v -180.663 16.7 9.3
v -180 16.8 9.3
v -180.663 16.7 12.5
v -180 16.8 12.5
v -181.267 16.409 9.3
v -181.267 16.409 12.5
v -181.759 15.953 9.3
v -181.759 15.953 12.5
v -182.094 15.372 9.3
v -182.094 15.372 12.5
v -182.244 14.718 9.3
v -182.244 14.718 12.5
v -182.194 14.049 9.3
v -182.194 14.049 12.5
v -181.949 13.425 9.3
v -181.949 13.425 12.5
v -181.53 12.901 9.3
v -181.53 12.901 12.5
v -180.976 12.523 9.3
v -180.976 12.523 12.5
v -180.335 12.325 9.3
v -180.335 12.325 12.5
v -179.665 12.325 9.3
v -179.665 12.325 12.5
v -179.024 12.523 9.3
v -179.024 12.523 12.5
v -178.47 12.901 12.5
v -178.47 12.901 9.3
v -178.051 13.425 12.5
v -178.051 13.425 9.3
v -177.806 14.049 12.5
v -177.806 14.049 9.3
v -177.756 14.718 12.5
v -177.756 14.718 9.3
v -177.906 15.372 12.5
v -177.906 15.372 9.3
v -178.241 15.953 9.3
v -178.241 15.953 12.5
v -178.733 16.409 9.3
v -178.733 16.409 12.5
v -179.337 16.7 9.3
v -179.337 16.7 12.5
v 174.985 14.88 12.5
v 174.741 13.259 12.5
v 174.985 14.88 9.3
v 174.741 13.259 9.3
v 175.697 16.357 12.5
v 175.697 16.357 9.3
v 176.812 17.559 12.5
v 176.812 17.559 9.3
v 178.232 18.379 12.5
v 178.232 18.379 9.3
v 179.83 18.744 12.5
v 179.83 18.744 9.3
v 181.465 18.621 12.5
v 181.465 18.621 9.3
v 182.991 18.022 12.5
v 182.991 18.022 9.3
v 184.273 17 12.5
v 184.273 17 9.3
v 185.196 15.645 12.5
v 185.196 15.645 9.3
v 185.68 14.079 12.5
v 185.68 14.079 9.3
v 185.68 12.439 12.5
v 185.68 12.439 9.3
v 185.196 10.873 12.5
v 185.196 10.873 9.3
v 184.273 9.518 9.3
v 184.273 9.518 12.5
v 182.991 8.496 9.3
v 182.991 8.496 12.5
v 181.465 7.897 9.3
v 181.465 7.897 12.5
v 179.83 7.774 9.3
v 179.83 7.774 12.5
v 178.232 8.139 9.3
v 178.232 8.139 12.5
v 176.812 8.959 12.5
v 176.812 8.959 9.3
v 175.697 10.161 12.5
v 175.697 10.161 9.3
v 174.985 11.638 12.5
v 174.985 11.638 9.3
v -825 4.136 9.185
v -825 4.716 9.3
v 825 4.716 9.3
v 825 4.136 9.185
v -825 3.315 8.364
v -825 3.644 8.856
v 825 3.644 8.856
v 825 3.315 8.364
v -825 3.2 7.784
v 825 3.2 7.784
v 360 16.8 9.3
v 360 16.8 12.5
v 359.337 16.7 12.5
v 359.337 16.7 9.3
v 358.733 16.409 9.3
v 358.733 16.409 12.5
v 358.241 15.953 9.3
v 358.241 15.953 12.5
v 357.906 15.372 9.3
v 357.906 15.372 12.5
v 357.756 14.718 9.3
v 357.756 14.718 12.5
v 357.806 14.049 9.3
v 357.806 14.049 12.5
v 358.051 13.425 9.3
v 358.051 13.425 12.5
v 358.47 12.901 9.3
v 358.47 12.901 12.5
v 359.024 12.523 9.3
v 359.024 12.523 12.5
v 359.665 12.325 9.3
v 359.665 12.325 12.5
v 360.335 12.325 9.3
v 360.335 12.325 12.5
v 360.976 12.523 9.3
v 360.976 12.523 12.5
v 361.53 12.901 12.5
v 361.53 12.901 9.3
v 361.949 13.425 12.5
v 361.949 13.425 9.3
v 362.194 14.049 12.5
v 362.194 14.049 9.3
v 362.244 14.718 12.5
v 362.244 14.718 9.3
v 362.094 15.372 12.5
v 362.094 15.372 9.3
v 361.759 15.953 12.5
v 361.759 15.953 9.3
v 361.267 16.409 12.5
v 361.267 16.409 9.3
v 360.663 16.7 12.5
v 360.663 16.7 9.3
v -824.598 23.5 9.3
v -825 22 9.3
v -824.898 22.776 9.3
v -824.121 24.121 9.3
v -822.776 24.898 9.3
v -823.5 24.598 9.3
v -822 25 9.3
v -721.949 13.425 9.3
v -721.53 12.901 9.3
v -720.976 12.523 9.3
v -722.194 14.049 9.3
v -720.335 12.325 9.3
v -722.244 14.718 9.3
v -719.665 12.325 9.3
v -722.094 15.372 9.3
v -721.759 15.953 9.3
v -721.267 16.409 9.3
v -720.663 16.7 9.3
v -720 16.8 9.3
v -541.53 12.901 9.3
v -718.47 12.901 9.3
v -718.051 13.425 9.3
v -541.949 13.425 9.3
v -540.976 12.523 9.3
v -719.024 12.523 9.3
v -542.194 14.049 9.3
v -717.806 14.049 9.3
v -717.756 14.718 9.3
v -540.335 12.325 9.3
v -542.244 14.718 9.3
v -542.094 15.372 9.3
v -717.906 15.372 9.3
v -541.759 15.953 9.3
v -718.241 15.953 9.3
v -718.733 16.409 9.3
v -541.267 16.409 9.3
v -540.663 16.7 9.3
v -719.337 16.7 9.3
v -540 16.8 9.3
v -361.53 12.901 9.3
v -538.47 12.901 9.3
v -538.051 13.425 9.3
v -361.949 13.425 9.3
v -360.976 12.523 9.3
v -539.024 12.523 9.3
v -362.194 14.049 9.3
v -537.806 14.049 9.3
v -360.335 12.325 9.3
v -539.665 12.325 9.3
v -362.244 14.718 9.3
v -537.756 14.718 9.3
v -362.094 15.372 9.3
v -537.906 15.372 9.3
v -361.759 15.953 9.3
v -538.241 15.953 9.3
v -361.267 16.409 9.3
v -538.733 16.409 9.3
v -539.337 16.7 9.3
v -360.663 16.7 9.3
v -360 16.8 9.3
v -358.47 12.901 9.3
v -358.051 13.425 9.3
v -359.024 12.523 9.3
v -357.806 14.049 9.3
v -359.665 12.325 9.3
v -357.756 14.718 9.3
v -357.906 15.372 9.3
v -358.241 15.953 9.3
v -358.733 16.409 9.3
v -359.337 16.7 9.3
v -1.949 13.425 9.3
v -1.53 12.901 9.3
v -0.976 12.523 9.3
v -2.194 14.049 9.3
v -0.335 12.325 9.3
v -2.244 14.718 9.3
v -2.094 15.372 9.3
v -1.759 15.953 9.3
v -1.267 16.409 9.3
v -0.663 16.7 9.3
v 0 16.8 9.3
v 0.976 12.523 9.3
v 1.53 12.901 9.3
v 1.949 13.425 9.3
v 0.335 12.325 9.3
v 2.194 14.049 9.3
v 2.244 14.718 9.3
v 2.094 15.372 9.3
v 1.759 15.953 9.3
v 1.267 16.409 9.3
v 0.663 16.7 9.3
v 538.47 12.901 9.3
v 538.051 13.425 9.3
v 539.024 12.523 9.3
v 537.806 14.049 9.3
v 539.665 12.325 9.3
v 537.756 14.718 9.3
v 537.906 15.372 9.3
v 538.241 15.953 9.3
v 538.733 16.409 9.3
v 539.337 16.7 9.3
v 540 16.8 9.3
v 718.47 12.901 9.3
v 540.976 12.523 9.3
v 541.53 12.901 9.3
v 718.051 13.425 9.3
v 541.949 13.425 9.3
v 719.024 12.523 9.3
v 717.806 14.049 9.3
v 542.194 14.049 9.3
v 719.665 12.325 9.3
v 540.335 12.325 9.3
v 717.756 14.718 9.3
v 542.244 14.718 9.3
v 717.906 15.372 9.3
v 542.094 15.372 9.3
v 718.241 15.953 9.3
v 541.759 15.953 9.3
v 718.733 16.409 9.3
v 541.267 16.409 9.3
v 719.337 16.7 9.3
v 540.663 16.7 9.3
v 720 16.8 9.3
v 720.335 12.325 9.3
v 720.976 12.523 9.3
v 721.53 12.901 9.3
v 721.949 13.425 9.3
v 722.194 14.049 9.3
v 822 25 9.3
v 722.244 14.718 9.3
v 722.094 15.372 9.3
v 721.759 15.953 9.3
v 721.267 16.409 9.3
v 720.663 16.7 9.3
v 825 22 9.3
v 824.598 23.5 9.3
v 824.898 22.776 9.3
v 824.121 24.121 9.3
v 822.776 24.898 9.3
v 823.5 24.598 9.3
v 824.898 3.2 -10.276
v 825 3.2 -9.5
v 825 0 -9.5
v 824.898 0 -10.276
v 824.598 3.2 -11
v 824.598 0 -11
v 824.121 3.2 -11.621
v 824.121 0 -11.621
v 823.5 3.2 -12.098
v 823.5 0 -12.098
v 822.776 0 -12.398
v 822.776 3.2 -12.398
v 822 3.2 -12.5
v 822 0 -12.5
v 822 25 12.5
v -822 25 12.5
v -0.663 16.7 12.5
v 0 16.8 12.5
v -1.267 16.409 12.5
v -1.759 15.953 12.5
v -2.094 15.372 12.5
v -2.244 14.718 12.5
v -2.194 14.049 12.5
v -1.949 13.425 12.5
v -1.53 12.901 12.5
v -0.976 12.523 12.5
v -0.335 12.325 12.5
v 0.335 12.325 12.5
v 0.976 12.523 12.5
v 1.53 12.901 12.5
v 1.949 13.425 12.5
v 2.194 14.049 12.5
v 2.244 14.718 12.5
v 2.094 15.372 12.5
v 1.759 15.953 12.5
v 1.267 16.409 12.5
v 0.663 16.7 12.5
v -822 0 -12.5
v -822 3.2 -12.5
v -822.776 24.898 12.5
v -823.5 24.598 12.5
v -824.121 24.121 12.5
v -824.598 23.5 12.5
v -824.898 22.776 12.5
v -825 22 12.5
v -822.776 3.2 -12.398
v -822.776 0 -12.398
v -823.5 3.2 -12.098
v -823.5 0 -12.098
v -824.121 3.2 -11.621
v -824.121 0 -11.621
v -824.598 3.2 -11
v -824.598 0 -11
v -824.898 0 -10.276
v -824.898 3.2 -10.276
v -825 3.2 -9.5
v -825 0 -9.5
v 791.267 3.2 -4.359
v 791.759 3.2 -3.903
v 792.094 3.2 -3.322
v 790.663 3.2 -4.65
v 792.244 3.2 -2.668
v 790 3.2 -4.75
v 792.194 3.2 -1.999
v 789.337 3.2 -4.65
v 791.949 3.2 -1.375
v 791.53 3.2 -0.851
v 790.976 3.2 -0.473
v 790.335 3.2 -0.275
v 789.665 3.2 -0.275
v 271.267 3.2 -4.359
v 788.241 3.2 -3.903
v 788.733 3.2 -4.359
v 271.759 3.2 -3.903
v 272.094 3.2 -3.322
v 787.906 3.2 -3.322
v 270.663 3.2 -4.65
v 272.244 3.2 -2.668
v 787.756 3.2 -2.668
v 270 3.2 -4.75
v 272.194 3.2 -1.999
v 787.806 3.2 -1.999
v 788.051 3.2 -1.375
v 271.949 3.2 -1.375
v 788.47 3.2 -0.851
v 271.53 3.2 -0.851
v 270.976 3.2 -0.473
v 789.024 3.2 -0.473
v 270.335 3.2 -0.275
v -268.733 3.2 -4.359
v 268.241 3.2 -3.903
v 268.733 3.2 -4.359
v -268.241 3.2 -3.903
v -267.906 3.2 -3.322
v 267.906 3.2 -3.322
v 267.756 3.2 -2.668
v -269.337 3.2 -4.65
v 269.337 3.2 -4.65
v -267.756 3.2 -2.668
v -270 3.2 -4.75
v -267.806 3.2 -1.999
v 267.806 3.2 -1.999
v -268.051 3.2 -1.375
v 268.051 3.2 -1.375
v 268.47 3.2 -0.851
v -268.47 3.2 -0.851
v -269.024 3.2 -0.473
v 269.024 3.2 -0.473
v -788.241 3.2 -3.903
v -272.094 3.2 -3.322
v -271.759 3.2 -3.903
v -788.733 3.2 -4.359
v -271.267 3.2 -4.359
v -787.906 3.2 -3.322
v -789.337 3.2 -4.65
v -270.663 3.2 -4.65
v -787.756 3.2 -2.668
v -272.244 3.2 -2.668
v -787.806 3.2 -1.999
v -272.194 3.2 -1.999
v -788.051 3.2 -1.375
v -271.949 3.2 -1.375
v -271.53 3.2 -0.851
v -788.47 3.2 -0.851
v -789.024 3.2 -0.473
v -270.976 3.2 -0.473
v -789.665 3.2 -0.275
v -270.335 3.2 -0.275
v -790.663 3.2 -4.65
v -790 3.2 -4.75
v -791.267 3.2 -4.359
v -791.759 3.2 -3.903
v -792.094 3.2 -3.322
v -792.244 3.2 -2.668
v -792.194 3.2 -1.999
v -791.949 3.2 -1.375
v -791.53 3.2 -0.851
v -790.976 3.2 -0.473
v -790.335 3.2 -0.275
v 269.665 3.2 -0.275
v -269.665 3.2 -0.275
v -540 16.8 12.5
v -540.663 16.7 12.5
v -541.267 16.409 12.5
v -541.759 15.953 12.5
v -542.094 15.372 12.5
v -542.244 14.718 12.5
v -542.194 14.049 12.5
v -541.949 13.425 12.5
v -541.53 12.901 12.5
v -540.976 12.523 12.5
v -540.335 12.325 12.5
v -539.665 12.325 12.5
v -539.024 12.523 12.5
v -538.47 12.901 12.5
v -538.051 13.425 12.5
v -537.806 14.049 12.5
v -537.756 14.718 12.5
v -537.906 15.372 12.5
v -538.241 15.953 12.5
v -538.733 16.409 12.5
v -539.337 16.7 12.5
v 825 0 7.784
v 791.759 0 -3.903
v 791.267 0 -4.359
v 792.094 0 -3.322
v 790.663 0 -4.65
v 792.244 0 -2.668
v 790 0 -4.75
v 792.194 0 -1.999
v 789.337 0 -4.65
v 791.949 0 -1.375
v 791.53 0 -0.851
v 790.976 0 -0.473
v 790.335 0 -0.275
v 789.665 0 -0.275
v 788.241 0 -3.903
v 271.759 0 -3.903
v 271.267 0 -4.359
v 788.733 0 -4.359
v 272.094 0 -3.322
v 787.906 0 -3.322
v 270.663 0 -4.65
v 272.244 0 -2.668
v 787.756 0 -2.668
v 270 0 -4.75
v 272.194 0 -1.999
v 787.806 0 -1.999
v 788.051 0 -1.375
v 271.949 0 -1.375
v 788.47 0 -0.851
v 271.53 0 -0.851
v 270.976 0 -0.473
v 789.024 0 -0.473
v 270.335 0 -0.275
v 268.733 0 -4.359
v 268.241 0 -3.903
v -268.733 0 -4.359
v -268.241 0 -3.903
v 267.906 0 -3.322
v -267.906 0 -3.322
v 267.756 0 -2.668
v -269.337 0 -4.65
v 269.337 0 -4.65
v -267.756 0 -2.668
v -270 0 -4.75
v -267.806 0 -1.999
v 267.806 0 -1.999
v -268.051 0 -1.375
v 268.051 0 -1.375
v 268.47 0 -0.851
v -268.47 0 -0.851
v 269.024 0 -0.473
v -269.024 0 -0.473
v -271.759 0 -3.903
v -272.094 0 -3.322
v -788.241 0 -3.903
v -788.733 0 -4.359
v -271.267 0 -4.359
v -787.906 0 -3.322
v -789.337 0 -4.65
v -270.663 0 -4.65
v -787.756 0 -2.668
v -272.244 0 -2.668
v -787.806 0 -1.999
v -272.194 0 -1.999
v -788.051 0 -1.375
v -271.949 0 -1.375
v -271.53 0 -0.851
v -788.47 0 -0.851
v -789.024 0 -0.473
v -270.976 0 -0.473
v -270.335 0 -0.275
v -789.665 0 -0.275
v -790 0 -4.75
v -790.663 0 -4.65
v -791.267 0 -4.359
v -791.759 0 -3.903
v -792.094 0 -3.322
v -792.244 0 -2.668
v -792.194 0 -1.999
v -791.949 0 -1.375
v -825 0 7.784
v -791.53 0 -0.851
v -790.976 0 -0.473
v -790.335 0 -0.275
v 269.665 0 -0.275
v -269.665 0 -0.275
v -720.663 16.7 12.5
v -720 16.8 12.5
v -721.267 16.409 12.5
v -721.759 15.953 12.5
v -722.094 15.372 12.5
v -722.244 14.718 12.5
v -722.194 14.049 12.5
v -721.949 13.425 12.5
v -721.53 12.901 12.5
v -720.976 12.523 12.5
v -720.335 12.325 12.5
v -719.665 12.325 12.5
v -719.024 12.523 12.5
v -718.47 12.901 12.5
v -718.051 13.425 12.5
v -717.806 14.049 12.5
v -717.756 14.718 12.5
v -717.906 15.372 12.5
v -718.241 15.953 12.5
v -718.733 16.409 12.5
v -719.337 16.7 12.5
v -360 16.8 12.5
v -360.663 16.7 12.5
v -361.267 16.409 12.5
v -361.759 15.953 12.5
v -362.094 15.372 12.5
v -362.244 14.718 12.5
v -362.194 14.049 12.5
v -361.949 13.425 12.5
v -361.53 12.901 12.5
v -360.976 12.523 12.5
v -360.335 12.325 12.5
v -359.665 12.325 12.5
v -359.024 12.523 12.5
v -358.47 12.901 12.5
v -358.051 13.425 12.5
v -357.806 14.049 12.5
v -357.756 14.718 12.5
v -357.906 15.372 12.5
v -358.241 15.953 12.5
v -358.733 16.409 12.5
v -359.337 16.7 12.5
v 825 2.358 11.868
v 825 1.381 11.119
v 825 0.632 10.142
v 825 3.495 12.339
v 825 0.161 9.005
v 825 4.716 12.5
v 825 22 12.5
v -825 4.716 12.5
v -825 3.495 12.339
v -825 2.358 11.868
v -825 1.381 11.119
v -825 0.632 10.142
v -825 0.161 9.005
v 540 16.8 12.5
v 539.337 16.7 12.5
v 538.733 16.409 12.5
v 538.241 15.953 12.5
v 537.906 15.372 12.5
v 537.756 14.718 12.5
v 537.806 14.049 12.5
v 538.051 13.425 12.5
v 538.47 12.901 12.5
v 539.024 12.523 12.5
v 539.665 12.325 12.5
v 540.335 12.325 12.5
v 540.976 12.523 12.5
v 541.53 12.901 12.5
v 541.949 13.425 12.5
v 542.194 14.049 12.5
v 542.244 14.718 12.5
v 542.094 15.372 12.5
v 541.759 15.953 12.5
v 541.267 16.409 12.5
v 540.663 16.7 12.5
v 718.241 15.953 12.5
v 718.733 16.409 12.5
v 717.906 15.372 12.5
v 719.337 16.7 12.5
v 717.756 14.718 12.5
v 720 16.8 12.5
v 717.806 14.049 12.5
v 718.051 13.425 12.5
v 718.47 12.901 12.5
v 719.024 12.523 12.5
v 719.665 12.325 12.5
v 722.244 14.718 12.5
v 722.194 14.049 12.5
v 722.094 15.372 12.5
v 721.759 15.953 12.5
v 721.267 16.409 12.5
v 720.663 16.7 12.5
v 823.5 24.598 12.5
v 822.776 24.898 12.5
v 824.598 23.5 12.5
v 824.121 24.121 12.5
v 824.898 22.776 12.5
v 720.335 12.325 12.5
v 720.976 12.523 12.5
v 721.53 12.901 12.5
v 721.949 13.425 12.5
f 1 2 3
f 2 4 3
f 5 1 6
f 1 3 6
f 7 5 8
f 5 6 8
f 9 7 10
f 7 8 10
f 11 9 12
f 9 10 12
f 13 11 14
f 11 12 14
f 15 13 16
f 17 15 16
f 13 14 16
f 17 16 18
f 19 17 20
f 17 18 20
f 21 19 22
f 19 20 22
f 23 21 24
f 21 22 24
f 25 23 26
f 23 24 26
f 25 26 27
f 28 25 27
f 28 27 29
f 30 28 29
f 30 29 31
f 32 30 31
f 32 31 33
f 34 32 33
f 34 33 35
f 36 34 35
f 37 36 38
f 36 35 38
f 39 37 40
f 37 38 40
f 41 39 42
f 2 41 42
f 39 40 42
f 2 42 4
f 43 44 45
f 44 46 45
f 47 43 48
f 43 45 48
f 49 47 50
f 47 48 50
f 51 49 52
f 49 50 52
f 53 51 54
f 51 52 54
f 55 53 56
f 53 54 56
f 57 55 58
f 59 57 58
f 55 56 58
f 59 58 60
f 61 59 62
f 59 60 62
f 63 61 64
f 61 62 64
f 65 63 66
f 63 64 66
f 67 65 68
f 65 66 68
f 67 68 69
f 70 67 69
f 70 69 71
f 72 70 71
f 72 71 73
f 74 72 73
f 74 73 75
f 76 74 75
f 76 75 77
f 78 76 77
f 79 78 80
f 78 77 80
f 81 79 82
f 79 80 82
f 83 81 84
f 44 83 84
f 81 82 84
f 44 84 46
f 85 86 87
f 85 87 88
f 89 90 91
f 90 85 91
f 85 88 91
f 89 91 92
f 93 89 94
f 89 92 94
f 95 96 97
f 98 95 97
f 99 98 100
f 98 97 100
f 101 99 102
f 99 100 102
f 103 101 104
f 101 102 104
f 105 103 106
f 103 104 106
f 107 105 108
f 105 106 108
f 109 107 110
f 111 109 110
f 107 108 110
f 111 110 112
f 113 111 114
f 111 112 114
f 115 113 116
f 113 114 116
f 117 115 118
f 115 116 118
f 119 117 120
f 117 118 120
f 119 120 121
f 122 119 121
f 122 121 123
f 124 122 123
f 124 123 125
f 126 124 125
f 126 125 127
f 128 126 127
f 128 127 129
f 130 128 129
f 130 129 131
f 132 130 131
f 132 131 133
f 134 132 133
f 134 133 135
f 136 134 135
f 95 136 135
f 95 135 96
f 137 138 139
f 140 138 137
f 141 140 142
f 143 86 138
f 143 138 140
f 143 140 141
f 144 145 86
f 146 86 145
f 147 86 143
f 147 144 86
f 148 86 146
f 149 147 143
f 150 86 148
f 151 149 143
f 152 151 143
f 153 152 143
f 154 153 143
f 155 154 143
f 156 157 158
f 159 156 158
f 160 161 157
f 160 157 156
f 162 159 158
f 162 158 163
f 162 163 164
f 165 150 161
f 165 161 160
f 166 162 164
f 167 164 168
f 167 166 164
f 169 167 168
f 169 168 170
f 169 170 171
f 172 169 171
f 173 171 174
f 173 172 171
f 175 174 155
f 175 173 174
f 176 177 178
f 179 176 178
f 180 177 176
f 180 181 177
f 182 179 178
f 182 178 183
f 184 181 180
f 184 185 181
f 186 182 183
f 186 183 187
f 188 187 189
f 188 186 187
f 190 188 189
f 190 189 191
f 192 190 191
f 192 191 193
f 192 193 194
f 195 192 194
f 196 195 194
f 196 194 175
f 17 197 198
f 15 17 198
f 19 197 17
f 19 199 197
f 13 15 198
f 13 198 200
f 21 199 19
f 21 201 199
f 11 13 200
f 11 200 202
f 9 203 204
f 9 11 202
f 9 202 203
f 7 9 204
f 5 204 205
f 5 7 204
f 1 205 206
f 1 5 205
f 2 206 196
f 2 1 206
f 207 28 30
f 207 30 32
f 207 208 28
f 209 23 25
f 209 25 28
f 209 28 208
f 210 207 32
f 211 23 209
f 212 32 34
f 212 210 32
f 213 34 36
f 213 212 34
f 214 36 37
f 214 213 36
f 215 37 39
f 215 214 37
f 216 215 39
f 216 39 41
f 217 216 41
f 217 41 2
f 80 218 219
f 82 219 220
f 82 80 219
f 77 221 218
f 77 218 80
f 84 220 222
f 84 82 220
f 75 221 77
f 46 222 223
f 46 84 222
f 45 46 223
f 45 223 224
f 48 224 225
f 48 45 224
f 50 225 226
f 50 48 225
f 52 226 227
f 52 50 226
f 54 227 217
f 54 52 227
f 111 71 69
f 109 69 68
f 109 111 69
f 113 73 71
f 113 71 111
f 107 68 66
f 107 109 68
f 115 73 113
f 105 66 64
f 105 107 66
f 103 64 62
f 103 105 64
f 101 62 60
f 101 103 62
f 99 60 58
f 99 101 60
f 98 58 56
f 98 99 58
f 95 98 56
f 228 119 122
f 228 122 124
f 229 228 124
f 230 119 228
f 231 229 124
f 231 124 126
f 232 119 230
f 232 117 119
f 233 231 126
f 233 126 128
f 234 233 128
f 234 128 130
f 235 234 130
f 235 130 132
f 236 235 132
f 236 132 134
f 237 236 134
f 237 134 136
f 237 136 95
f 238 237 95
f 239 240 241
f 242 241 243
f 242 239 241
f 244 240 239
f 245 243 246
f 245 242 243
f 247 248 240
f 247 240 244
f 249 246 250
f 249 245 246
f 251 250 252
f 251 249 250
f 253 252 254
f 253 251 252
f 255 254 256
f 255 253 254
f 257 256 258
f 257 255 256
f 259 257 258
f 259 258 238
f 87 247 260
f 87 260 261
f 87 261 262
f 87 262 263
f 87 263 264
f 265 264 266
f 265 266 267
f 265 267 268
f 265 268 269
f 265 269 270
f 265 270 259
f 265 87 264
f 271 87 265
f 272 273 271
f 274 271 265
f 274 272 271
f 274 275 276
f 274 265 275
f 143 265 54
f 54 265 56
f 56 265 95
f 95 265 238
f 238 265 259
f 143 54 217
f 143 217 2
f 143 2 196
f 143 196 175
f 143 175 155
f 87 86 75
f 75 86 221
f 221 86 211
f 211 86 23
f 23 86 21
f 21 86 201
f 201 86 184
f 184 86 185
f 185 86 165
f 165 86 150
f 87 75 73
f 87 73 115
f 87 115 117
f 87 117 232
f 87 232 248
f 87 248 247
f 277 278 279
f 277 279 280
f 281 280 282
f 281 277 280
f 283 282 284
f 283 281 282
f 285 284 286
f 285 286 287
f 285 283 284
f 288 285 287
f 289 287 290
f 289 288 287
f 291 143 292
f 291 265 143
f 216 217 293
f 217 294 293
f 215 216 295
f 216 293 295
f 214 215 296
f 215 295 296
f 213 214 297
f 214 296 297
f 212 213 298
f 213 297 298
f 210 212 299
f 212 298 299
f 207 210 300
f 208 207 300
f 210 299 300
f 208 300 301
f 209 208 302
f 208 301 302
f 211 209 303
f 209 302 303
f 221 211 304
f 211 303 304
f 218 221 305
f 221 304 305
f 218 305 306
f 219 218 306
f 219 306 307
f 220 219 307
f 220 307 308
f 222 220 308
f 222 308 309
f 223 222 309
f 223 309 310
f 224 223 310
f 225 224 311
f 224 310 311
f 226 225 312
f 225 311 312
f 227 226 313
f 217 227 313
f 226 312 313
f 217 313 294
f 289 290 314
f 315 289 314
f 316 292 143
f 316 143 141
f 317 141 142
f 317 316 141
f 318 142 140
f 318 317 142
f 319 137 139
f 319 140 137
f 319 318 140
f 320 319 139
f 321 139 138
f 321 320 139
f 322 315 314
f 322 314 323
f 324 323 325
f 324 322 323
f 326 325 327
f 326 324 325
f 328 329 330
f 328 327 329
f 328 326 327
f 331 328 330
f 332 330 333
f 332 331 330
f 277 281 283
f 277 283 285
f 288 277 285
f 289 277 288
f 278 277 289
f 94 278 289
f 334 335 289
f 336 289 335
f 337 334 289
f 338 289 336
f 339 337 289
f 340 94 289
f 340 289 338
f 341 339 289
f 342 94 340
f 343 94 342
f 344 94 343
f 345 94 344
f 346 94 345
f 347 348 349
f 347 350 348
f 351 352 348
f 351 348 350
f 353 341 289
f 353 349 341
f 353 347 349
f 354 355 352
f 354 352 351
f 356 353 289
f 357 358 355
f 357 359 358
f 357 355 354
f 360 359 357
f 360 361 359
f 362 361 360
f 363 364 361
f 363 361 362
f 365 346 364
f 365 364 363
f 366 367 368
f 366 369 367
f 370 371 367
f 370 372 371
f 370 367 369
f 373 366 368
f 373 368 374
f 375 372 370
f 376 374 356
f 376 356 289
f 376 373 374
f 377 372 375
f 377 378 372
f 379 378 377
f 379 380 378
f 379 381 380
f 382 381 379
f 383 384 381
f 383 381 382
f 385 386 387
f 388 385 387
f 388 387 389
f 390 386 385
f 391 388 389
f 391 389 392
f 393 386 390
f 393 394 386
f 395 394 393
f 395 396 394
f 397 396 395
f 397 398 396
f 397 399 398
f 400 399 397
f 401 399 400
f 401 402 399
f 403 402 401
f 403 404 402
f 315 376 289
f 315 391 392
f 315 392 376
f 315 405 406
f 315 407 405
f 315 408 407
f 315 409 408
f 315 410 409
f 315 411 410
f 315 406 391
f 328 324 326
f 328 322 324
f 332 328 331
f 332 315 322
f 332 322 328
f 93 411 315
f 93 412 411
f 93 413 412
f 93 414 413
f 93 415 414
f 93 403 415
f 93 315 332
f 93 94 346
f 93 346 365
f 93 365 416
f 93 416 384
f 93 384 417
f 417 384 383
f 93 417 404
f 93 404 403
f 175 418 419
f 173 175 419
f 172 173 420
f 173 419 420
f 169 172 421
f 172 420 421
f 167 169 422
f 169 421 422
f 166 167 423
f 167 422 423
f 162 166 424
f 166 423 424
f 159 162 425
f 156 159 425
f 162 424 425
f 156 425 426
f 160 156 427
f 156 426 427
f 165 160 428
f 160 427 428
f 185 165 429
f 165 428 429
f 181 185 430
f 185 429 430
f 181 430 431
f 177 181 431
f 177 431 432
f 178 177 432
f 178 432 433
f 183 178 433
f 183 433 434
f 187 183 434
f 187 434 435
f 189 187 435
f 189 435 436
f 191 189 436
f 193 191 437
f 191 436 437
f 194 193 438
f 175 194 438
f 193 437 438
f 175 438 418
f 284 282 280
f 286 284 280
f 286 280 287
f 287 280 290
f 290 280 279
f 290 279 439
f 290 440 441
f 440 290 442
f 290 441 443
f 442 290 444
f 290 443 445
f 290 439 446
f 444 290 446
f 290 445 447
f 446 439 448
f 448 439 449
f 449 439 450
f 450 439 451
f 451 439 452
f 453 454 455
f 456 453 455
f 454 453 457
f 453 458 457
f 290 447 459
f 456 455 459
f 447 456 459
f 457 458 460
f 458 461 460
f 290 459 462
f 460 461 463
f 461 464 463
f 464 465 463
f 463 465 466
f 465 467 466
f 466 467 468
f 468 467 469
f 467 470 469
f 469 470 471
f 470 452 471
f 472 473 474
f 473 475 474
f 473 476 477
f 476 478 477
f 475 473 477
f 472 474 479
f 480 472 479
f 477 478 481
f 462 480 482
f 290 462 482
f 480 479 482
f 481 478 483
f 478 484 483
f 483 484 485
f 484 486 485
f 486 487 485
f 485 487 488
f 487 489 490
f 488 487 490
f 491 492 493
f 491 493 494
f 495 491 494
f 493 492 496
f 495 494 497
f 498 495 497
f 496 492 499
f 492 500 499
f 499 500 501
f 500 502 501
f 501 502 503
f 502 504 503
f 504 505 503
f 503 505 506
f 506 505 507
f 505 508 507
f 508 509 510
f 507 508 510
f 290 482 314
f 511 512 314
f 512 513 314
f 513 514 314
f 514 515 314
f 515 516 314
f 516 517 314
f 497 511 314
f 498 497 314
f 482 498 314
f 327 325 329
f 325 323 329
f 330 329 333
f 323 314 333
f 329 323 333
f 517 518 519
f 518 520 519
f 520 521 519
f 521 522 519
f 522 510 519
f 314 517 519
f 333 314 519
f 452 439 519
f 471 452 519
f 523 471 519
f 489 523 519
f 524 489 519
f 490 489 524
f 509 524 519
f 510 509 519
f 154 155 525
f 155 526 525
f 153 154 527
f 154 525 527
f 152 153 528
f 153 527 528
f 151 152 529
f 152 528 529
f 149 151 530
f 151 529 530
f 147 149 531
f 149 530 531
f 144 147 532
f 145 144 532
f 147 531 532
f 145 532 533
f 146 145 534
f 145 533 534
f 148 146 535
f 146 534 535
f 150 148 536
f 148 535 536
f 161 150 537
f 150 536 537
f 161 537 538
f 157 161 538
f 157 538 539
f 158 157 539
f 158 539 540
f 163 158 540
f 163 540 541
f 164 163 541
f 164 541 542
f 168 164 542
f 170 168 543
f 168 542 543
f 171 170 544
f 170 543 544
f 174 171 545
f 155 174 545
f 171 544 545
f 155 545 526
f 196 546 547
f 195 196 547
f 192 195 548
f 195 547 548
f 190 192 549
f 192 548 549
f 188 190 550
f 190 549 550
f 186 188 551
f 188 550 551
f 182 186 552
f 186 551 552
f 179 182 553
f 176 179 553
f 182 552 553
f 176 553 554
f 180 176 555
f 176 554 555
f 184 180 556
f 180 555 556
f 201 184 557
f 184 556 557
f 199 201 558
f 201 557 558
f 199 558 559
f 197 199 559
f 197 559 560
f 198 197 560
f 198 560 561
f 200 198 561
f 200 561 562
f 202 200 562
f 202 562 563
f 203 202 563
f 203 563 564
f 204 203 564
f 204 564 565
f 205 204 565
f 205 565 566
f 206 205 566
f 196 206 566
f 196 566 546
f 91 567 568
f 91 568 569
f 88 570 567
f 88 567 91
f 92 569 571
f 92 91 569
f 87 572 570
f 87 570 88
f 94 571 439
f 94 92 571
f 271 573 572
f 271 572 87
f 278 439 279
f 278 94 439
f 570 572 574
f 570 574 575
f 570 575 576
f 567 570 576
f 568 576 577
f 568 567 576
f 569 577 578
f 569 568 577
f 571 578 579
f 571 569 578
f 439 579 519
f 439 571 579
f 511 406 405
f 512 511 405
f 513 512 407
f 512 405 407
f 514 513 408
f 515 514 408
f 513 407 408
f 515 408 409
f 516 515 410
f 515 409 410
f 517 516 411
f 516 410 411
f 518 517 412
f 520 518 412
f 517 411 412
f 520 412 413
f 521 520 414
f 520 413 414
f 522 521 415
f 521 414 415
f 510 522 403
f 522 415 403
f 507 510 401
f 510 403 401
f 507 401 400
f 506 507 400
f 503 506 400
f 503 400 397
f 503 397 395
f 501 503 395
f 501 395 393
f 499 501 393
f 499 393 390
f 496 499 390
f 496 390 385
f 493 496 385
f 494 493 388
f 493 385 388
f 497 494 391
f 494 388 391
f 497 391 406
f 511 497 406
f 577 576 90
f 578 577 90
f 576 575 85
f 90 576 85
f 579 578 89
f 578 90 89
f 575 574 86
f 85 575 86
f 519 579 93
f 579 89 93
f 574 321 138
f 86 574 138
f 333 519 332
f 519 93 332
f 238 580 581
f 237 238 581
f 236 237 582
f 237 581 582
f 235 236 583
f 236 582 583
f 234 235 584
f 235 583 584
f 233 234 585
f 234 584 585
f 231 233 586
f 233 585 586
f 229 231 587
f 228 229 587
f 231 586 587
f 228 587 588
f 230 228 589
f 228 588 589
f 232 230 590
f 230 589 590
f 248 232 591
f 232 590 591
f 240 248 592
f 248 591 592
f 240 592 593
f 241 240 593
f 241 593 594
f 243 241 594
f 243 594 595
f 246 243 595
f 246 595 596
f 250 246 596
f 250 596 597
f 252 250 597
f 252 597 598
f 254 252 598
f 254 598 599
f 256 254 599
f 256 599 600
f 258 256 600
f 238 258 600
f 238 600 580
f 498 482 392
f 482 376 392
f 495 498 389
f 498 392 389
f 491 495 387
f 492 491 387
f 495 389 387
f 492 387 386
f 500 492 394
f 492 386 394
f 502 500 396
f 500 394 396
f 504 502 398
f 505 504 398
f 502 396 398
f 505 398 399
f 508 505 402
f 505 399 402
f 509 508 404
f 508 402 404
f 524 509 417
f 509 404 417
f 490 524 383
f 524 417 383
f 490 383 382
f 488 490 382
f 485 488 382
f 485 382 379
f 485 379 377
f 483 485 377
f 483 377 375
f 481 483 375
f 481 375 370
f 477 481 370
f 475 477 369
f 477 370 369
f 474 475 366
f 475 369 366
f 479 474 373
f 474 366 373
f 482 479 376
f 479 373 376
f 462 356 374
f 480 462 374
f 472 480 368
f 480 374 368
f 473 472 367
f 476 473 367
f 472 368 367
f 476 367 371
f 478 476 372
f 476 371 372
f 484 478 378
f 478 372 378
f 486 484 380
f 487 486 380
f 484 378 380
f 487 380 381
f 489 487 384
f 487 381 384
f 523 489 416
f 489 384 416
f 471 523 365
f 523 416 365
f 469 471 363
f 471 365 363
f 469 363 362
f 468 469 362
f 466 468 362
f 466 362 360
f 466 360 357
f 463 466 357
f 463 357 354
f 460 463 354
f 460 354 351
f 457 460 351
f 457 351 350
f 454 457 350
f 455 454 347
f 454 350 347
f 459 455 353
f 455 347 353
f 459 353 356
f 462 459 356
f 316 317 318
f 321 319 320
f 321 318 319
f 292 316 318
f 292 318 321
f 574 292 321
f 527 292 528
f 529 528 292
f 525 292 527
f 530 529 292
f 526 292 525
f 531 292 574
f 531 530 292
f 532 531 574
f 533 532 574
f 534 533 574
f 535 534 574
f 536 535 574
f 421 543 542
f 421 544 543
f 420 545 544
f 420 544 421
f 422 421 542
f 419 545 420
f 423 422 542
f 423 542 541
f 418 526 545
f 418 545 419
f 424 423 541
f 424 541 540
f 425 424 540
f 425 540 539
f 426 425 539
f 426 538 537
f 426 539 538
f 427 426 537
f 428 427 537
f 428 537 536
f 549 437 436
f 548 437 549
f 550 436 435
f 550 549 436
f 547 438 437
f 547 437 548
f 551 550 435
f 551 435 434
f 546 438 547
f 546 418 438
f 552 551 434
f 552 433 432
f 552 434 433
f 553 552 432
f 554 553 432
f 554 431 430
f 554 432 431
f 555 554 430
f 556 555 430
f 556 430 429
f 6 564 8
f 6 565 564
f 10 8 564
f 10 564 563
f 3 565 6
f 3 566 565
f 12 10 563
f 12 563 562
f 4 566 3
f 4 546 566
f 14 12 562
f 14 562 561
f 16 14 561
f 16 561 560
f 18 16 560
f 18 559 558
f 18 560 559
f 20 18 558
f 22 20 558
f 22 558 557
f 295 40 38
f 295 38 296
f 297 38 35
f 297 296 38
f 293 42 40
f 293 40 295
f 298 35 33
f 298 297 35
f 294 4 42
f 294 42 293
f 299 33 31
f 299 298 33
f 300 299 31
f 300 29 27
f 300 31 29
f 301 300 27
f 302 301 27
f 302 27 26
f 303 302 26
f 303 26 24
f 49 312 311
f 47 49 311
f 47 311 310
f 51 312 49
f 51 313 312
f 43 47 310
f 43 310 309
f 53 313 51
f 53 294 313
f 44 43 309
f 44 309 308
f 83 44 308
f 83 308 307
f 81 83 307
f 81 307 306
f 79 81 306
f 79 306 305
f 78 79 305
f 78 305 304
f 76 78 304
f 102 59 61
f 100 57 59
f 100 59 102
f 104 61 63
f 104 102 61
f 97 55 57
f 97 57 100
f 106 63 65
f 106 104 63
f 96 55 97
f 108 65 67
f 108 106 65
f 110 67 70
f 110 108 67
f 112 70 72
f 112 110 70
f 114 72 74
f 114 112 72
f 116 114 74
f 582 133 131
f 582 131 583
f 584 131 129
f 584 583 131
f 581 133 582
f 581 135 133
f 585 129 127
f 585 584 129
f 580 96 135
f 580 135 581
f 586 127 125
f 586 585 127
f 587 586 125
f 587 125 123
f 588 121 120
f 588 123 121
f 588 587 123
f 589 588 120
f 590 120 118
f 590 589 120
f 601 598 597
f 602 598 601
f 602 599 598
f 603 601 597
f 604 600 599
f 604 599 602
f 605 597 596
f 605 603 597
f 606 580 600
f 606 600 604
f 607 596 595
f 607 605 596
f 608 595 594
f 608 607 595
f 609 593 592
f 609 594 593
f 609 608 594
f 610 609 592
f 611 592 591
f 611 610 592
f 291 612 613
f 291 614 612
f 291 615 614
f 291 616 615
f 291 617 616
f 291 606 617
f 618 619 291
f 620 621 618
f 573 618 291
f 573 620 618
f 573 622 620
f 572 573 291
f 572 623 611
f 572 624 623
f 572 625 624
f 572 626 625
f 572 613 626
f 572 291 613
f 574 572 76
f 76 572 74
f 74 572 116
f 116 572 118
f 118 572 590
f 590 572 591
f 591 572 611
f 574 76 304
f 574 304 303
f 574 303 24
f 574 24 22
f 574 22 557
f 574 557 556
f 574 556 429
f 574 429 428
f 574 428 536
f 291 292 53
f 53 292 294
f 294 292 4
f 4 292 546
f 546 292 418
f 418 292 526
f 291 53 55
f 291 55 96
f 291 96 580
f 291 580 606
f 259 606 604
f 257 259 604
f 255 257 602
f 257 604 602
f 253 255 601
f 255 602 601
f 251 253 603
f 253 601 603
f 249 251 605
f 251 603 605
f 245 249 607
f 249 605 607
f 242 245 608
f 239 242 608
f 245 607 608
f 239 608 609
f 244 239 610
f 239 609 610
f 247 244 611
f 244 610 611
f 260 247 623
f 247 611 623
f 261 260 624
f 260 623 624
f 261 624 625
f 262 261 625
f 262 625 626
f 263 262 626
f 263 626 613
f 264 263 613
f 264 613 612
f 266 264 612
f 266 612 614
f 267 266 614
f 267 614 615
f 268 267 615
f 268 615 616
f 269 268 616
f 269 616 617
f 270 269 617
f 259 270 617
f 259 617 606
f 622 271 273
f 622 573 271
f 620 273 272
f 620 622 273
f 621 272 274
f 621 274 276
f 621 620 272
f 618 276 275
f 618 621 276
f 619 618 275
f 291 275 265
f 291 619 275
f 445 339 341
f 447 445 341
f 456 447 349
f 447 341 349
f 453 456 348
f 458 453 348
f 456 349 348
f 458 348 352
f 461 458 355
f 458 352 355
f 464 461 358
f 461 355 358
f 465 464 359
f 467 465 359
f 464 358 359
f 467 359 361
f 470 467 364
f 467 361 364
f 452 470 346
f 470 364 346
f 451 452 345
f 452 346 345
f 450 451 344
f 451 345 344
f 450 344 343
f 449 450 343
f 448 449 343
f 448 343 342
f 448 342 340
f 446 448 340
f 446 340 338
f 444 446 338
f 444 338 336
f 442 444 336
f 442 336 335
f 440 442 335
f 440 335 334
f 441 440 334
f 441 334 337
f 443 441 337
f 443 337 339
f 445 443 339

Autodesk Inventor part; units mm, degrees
ref_plane "YZ Plane" through (0, 0, 0) normal (1, 0, 0) x (0, 1, 0)
ref_plane "XZ Plane" through (0, 0, 0) normal (0, 1, 0) x (-1, 0, 0)
ref_plane "XY Plane" through (0, 0, 0) normal (0, 0, 1) x (1, 0, 0)
sketch "Sketch1" plane through (0, 0, 0) normal (0, 1, 0) x (-1, 0, 0)
  line L0 (825, 12.5) -> (-825, 12.5)
  line L1 (-825, 12.5) -> (-825, -12.5)
  line L2 (-825, -12.5) -> (825, -12.5)
  line L3 (825, -12.5) -> (825, 12.5)
  line L4 (825, 12.5) -> (-825, -12.5) construction
  line L5 (-825, 12.5) -> (825, -12.5) construction
  point P0 (0, 0)
  dimension "d0" = 1650
  dimension "d1" = 25
extrude "Plate1" add sketch "Sketch1" along normal blind 3.2
sketch "Sketch2" plane through (825, 0, 9.3) normal (0, 0, 1) x (1, 0, 0)
  line L0 (-1650, 0) -> (0, 0)
  line L1 (0, 0) -> (0, 25)
  line L2 (0, 25) -> (-1650, 25)
  line L3 (-1650, 25) -> (-1650, 0)
edge flange "Flange1" height 25 angle 90 thickness 3.2 bend radius 1.516 thickness toward (0, 0, 1) relief tear relief width 3.2 relief depth 1.6 edges at (0, 3.2, 12.5) wall of the first edge with corners at (-825, 0, 9.3) (825, 0, 9.3) (825, 25, 9.3) (-825, 25, 9.3)
bend "Bend1"
corner "Corner1"
sketch "Sketch3" plane through (825, 25, 9.3) normal (0, 0, -1) x (-1, 0, 0)
  circle A0 centre (105, -10.45) radius 1.5706 projected
  circle A1 centre (285, -10.45) radius 1.5706 projected
  circle A2 centre (465, -10.45) radius 1.5706 projected
  circle A3 centre (825, -10.45) radius 1.5706 projected
  circle A4 centre (1005, -10.45) radius 1.5706 projected
  circle A5 centre (1185, -10.45) radius 1.5706 projected
  circle A6 centre (1365, -10.45) radius 1.5706 projected
  circle A7 centre (1545, -10.45) radius 1.5706 projected
  point P0 (825, -25)
hole "Hole1" at (540, 14.55, 9.3) at (720, 14.55, 9.3) at (360, 14.55, 9.3) at (0, 14.55, 9.3) at (-180, 14.55, 9.3) at (-360, 14.55, 9.3) at (-540, 14.55, 9.3) at (-720, 14.55, 9.3) direction (0, 0, 1) diameter 4.5 depth 3.2 tip angle 118 clearance for "Countersunk Flat Head Screw ISO 2009/7046" size "M4" standard "ISO"
sketch "Sketch8" plane through (0, 0, 0) normal (0, -1, 0) x (1, 0, 0)
  line L0 (-825, -12.5) -> (825, -12.5) projected
  line L1 (0, -12.5) -> (0, -2.5)
  line L2 (0, -2.5) -> (-270, -2.5)
  line L3 (-270, -2.5) -> (-790, -2.5)
  line L4 (0, -2.5) -> (270, -2.5)
  line L5 (270, -2.5) -> (790, -2.5)
  point P0 (0, 0)
  dimension "d40" = 10
  dimension "d41" = 270
  dimension "d42" = 520
  dimension "d43" = 180
hole "Hole2" at (-790, 0, -2.5) at (-270, 0, -2.5) at (270, 0, -2.5) at (790, 0, -2.5) direction (0, 1, 0) diameter 4.5 depth 3.2 tip angle 118 clearance for "Countersunk Flat Head Screw ISO 2009/7046" size "M4" standard "ISO"
fillet "Corner Round1" radius 3 4 edges at (825, 1.6, -12.5) (-825, 25, 10.9) (825, 25, 10.9) (-825, 1.6, -12.5)
sketch "Sketch9" plane through (825, 4.716, 9.3) normal (0, 0, -1) x (-1, 0, 0)
  circle A0 centre (644.759, 8.543) radius 2.5 projected
  circle A1 centre (644.759, 8.543) radius 5.5
  point P0 (825, -4.716)
  dimension "d45" = 11
extrude "Cut3" cut sketch "Sketch9" against normal blind 3.2 contours A0 | A1
equation "\"d18\" = Thickness"
equation "\"d37\" = Thickness"
equation "\"d46\" = Thickness"
equation "\"d2\" = Thickness"
equation "\"d3\" = BendReliefWidth"
equation "\"d4\" = BendReliefDepth"
equation "\"d5\" = MinimumRemnant"
equation "\"d6\" = TransitionRadius"
equation "\"d9\" = BendRadius"
equation "\"d10\" = CornerReliefSize"
equation "\"d11\" = GapSize"
equation "\"d12\" = JacobiRadiusSize"
equation "\"BendReliefWidth\" = Thickness"
equation "\"BendReliefDepth\" = 0.5 * Thickness"
equation "\"CornerReliefSize\" = 4 * Thickness"
equation "\"MinimumRemnant\" = 2 * Thickness"
equation "\"TransitionRadius\" = BendRadius"
equation "\"JacobiRadiusSize\" = BendRadius"
equation "\"GapSize\" = Thickness"
equation "\"Thickness\" = 3.2"
equation "\"BendRadius\" = 1.516"
properties part number "SP47V1 Chapa Acrilico Pasador"
